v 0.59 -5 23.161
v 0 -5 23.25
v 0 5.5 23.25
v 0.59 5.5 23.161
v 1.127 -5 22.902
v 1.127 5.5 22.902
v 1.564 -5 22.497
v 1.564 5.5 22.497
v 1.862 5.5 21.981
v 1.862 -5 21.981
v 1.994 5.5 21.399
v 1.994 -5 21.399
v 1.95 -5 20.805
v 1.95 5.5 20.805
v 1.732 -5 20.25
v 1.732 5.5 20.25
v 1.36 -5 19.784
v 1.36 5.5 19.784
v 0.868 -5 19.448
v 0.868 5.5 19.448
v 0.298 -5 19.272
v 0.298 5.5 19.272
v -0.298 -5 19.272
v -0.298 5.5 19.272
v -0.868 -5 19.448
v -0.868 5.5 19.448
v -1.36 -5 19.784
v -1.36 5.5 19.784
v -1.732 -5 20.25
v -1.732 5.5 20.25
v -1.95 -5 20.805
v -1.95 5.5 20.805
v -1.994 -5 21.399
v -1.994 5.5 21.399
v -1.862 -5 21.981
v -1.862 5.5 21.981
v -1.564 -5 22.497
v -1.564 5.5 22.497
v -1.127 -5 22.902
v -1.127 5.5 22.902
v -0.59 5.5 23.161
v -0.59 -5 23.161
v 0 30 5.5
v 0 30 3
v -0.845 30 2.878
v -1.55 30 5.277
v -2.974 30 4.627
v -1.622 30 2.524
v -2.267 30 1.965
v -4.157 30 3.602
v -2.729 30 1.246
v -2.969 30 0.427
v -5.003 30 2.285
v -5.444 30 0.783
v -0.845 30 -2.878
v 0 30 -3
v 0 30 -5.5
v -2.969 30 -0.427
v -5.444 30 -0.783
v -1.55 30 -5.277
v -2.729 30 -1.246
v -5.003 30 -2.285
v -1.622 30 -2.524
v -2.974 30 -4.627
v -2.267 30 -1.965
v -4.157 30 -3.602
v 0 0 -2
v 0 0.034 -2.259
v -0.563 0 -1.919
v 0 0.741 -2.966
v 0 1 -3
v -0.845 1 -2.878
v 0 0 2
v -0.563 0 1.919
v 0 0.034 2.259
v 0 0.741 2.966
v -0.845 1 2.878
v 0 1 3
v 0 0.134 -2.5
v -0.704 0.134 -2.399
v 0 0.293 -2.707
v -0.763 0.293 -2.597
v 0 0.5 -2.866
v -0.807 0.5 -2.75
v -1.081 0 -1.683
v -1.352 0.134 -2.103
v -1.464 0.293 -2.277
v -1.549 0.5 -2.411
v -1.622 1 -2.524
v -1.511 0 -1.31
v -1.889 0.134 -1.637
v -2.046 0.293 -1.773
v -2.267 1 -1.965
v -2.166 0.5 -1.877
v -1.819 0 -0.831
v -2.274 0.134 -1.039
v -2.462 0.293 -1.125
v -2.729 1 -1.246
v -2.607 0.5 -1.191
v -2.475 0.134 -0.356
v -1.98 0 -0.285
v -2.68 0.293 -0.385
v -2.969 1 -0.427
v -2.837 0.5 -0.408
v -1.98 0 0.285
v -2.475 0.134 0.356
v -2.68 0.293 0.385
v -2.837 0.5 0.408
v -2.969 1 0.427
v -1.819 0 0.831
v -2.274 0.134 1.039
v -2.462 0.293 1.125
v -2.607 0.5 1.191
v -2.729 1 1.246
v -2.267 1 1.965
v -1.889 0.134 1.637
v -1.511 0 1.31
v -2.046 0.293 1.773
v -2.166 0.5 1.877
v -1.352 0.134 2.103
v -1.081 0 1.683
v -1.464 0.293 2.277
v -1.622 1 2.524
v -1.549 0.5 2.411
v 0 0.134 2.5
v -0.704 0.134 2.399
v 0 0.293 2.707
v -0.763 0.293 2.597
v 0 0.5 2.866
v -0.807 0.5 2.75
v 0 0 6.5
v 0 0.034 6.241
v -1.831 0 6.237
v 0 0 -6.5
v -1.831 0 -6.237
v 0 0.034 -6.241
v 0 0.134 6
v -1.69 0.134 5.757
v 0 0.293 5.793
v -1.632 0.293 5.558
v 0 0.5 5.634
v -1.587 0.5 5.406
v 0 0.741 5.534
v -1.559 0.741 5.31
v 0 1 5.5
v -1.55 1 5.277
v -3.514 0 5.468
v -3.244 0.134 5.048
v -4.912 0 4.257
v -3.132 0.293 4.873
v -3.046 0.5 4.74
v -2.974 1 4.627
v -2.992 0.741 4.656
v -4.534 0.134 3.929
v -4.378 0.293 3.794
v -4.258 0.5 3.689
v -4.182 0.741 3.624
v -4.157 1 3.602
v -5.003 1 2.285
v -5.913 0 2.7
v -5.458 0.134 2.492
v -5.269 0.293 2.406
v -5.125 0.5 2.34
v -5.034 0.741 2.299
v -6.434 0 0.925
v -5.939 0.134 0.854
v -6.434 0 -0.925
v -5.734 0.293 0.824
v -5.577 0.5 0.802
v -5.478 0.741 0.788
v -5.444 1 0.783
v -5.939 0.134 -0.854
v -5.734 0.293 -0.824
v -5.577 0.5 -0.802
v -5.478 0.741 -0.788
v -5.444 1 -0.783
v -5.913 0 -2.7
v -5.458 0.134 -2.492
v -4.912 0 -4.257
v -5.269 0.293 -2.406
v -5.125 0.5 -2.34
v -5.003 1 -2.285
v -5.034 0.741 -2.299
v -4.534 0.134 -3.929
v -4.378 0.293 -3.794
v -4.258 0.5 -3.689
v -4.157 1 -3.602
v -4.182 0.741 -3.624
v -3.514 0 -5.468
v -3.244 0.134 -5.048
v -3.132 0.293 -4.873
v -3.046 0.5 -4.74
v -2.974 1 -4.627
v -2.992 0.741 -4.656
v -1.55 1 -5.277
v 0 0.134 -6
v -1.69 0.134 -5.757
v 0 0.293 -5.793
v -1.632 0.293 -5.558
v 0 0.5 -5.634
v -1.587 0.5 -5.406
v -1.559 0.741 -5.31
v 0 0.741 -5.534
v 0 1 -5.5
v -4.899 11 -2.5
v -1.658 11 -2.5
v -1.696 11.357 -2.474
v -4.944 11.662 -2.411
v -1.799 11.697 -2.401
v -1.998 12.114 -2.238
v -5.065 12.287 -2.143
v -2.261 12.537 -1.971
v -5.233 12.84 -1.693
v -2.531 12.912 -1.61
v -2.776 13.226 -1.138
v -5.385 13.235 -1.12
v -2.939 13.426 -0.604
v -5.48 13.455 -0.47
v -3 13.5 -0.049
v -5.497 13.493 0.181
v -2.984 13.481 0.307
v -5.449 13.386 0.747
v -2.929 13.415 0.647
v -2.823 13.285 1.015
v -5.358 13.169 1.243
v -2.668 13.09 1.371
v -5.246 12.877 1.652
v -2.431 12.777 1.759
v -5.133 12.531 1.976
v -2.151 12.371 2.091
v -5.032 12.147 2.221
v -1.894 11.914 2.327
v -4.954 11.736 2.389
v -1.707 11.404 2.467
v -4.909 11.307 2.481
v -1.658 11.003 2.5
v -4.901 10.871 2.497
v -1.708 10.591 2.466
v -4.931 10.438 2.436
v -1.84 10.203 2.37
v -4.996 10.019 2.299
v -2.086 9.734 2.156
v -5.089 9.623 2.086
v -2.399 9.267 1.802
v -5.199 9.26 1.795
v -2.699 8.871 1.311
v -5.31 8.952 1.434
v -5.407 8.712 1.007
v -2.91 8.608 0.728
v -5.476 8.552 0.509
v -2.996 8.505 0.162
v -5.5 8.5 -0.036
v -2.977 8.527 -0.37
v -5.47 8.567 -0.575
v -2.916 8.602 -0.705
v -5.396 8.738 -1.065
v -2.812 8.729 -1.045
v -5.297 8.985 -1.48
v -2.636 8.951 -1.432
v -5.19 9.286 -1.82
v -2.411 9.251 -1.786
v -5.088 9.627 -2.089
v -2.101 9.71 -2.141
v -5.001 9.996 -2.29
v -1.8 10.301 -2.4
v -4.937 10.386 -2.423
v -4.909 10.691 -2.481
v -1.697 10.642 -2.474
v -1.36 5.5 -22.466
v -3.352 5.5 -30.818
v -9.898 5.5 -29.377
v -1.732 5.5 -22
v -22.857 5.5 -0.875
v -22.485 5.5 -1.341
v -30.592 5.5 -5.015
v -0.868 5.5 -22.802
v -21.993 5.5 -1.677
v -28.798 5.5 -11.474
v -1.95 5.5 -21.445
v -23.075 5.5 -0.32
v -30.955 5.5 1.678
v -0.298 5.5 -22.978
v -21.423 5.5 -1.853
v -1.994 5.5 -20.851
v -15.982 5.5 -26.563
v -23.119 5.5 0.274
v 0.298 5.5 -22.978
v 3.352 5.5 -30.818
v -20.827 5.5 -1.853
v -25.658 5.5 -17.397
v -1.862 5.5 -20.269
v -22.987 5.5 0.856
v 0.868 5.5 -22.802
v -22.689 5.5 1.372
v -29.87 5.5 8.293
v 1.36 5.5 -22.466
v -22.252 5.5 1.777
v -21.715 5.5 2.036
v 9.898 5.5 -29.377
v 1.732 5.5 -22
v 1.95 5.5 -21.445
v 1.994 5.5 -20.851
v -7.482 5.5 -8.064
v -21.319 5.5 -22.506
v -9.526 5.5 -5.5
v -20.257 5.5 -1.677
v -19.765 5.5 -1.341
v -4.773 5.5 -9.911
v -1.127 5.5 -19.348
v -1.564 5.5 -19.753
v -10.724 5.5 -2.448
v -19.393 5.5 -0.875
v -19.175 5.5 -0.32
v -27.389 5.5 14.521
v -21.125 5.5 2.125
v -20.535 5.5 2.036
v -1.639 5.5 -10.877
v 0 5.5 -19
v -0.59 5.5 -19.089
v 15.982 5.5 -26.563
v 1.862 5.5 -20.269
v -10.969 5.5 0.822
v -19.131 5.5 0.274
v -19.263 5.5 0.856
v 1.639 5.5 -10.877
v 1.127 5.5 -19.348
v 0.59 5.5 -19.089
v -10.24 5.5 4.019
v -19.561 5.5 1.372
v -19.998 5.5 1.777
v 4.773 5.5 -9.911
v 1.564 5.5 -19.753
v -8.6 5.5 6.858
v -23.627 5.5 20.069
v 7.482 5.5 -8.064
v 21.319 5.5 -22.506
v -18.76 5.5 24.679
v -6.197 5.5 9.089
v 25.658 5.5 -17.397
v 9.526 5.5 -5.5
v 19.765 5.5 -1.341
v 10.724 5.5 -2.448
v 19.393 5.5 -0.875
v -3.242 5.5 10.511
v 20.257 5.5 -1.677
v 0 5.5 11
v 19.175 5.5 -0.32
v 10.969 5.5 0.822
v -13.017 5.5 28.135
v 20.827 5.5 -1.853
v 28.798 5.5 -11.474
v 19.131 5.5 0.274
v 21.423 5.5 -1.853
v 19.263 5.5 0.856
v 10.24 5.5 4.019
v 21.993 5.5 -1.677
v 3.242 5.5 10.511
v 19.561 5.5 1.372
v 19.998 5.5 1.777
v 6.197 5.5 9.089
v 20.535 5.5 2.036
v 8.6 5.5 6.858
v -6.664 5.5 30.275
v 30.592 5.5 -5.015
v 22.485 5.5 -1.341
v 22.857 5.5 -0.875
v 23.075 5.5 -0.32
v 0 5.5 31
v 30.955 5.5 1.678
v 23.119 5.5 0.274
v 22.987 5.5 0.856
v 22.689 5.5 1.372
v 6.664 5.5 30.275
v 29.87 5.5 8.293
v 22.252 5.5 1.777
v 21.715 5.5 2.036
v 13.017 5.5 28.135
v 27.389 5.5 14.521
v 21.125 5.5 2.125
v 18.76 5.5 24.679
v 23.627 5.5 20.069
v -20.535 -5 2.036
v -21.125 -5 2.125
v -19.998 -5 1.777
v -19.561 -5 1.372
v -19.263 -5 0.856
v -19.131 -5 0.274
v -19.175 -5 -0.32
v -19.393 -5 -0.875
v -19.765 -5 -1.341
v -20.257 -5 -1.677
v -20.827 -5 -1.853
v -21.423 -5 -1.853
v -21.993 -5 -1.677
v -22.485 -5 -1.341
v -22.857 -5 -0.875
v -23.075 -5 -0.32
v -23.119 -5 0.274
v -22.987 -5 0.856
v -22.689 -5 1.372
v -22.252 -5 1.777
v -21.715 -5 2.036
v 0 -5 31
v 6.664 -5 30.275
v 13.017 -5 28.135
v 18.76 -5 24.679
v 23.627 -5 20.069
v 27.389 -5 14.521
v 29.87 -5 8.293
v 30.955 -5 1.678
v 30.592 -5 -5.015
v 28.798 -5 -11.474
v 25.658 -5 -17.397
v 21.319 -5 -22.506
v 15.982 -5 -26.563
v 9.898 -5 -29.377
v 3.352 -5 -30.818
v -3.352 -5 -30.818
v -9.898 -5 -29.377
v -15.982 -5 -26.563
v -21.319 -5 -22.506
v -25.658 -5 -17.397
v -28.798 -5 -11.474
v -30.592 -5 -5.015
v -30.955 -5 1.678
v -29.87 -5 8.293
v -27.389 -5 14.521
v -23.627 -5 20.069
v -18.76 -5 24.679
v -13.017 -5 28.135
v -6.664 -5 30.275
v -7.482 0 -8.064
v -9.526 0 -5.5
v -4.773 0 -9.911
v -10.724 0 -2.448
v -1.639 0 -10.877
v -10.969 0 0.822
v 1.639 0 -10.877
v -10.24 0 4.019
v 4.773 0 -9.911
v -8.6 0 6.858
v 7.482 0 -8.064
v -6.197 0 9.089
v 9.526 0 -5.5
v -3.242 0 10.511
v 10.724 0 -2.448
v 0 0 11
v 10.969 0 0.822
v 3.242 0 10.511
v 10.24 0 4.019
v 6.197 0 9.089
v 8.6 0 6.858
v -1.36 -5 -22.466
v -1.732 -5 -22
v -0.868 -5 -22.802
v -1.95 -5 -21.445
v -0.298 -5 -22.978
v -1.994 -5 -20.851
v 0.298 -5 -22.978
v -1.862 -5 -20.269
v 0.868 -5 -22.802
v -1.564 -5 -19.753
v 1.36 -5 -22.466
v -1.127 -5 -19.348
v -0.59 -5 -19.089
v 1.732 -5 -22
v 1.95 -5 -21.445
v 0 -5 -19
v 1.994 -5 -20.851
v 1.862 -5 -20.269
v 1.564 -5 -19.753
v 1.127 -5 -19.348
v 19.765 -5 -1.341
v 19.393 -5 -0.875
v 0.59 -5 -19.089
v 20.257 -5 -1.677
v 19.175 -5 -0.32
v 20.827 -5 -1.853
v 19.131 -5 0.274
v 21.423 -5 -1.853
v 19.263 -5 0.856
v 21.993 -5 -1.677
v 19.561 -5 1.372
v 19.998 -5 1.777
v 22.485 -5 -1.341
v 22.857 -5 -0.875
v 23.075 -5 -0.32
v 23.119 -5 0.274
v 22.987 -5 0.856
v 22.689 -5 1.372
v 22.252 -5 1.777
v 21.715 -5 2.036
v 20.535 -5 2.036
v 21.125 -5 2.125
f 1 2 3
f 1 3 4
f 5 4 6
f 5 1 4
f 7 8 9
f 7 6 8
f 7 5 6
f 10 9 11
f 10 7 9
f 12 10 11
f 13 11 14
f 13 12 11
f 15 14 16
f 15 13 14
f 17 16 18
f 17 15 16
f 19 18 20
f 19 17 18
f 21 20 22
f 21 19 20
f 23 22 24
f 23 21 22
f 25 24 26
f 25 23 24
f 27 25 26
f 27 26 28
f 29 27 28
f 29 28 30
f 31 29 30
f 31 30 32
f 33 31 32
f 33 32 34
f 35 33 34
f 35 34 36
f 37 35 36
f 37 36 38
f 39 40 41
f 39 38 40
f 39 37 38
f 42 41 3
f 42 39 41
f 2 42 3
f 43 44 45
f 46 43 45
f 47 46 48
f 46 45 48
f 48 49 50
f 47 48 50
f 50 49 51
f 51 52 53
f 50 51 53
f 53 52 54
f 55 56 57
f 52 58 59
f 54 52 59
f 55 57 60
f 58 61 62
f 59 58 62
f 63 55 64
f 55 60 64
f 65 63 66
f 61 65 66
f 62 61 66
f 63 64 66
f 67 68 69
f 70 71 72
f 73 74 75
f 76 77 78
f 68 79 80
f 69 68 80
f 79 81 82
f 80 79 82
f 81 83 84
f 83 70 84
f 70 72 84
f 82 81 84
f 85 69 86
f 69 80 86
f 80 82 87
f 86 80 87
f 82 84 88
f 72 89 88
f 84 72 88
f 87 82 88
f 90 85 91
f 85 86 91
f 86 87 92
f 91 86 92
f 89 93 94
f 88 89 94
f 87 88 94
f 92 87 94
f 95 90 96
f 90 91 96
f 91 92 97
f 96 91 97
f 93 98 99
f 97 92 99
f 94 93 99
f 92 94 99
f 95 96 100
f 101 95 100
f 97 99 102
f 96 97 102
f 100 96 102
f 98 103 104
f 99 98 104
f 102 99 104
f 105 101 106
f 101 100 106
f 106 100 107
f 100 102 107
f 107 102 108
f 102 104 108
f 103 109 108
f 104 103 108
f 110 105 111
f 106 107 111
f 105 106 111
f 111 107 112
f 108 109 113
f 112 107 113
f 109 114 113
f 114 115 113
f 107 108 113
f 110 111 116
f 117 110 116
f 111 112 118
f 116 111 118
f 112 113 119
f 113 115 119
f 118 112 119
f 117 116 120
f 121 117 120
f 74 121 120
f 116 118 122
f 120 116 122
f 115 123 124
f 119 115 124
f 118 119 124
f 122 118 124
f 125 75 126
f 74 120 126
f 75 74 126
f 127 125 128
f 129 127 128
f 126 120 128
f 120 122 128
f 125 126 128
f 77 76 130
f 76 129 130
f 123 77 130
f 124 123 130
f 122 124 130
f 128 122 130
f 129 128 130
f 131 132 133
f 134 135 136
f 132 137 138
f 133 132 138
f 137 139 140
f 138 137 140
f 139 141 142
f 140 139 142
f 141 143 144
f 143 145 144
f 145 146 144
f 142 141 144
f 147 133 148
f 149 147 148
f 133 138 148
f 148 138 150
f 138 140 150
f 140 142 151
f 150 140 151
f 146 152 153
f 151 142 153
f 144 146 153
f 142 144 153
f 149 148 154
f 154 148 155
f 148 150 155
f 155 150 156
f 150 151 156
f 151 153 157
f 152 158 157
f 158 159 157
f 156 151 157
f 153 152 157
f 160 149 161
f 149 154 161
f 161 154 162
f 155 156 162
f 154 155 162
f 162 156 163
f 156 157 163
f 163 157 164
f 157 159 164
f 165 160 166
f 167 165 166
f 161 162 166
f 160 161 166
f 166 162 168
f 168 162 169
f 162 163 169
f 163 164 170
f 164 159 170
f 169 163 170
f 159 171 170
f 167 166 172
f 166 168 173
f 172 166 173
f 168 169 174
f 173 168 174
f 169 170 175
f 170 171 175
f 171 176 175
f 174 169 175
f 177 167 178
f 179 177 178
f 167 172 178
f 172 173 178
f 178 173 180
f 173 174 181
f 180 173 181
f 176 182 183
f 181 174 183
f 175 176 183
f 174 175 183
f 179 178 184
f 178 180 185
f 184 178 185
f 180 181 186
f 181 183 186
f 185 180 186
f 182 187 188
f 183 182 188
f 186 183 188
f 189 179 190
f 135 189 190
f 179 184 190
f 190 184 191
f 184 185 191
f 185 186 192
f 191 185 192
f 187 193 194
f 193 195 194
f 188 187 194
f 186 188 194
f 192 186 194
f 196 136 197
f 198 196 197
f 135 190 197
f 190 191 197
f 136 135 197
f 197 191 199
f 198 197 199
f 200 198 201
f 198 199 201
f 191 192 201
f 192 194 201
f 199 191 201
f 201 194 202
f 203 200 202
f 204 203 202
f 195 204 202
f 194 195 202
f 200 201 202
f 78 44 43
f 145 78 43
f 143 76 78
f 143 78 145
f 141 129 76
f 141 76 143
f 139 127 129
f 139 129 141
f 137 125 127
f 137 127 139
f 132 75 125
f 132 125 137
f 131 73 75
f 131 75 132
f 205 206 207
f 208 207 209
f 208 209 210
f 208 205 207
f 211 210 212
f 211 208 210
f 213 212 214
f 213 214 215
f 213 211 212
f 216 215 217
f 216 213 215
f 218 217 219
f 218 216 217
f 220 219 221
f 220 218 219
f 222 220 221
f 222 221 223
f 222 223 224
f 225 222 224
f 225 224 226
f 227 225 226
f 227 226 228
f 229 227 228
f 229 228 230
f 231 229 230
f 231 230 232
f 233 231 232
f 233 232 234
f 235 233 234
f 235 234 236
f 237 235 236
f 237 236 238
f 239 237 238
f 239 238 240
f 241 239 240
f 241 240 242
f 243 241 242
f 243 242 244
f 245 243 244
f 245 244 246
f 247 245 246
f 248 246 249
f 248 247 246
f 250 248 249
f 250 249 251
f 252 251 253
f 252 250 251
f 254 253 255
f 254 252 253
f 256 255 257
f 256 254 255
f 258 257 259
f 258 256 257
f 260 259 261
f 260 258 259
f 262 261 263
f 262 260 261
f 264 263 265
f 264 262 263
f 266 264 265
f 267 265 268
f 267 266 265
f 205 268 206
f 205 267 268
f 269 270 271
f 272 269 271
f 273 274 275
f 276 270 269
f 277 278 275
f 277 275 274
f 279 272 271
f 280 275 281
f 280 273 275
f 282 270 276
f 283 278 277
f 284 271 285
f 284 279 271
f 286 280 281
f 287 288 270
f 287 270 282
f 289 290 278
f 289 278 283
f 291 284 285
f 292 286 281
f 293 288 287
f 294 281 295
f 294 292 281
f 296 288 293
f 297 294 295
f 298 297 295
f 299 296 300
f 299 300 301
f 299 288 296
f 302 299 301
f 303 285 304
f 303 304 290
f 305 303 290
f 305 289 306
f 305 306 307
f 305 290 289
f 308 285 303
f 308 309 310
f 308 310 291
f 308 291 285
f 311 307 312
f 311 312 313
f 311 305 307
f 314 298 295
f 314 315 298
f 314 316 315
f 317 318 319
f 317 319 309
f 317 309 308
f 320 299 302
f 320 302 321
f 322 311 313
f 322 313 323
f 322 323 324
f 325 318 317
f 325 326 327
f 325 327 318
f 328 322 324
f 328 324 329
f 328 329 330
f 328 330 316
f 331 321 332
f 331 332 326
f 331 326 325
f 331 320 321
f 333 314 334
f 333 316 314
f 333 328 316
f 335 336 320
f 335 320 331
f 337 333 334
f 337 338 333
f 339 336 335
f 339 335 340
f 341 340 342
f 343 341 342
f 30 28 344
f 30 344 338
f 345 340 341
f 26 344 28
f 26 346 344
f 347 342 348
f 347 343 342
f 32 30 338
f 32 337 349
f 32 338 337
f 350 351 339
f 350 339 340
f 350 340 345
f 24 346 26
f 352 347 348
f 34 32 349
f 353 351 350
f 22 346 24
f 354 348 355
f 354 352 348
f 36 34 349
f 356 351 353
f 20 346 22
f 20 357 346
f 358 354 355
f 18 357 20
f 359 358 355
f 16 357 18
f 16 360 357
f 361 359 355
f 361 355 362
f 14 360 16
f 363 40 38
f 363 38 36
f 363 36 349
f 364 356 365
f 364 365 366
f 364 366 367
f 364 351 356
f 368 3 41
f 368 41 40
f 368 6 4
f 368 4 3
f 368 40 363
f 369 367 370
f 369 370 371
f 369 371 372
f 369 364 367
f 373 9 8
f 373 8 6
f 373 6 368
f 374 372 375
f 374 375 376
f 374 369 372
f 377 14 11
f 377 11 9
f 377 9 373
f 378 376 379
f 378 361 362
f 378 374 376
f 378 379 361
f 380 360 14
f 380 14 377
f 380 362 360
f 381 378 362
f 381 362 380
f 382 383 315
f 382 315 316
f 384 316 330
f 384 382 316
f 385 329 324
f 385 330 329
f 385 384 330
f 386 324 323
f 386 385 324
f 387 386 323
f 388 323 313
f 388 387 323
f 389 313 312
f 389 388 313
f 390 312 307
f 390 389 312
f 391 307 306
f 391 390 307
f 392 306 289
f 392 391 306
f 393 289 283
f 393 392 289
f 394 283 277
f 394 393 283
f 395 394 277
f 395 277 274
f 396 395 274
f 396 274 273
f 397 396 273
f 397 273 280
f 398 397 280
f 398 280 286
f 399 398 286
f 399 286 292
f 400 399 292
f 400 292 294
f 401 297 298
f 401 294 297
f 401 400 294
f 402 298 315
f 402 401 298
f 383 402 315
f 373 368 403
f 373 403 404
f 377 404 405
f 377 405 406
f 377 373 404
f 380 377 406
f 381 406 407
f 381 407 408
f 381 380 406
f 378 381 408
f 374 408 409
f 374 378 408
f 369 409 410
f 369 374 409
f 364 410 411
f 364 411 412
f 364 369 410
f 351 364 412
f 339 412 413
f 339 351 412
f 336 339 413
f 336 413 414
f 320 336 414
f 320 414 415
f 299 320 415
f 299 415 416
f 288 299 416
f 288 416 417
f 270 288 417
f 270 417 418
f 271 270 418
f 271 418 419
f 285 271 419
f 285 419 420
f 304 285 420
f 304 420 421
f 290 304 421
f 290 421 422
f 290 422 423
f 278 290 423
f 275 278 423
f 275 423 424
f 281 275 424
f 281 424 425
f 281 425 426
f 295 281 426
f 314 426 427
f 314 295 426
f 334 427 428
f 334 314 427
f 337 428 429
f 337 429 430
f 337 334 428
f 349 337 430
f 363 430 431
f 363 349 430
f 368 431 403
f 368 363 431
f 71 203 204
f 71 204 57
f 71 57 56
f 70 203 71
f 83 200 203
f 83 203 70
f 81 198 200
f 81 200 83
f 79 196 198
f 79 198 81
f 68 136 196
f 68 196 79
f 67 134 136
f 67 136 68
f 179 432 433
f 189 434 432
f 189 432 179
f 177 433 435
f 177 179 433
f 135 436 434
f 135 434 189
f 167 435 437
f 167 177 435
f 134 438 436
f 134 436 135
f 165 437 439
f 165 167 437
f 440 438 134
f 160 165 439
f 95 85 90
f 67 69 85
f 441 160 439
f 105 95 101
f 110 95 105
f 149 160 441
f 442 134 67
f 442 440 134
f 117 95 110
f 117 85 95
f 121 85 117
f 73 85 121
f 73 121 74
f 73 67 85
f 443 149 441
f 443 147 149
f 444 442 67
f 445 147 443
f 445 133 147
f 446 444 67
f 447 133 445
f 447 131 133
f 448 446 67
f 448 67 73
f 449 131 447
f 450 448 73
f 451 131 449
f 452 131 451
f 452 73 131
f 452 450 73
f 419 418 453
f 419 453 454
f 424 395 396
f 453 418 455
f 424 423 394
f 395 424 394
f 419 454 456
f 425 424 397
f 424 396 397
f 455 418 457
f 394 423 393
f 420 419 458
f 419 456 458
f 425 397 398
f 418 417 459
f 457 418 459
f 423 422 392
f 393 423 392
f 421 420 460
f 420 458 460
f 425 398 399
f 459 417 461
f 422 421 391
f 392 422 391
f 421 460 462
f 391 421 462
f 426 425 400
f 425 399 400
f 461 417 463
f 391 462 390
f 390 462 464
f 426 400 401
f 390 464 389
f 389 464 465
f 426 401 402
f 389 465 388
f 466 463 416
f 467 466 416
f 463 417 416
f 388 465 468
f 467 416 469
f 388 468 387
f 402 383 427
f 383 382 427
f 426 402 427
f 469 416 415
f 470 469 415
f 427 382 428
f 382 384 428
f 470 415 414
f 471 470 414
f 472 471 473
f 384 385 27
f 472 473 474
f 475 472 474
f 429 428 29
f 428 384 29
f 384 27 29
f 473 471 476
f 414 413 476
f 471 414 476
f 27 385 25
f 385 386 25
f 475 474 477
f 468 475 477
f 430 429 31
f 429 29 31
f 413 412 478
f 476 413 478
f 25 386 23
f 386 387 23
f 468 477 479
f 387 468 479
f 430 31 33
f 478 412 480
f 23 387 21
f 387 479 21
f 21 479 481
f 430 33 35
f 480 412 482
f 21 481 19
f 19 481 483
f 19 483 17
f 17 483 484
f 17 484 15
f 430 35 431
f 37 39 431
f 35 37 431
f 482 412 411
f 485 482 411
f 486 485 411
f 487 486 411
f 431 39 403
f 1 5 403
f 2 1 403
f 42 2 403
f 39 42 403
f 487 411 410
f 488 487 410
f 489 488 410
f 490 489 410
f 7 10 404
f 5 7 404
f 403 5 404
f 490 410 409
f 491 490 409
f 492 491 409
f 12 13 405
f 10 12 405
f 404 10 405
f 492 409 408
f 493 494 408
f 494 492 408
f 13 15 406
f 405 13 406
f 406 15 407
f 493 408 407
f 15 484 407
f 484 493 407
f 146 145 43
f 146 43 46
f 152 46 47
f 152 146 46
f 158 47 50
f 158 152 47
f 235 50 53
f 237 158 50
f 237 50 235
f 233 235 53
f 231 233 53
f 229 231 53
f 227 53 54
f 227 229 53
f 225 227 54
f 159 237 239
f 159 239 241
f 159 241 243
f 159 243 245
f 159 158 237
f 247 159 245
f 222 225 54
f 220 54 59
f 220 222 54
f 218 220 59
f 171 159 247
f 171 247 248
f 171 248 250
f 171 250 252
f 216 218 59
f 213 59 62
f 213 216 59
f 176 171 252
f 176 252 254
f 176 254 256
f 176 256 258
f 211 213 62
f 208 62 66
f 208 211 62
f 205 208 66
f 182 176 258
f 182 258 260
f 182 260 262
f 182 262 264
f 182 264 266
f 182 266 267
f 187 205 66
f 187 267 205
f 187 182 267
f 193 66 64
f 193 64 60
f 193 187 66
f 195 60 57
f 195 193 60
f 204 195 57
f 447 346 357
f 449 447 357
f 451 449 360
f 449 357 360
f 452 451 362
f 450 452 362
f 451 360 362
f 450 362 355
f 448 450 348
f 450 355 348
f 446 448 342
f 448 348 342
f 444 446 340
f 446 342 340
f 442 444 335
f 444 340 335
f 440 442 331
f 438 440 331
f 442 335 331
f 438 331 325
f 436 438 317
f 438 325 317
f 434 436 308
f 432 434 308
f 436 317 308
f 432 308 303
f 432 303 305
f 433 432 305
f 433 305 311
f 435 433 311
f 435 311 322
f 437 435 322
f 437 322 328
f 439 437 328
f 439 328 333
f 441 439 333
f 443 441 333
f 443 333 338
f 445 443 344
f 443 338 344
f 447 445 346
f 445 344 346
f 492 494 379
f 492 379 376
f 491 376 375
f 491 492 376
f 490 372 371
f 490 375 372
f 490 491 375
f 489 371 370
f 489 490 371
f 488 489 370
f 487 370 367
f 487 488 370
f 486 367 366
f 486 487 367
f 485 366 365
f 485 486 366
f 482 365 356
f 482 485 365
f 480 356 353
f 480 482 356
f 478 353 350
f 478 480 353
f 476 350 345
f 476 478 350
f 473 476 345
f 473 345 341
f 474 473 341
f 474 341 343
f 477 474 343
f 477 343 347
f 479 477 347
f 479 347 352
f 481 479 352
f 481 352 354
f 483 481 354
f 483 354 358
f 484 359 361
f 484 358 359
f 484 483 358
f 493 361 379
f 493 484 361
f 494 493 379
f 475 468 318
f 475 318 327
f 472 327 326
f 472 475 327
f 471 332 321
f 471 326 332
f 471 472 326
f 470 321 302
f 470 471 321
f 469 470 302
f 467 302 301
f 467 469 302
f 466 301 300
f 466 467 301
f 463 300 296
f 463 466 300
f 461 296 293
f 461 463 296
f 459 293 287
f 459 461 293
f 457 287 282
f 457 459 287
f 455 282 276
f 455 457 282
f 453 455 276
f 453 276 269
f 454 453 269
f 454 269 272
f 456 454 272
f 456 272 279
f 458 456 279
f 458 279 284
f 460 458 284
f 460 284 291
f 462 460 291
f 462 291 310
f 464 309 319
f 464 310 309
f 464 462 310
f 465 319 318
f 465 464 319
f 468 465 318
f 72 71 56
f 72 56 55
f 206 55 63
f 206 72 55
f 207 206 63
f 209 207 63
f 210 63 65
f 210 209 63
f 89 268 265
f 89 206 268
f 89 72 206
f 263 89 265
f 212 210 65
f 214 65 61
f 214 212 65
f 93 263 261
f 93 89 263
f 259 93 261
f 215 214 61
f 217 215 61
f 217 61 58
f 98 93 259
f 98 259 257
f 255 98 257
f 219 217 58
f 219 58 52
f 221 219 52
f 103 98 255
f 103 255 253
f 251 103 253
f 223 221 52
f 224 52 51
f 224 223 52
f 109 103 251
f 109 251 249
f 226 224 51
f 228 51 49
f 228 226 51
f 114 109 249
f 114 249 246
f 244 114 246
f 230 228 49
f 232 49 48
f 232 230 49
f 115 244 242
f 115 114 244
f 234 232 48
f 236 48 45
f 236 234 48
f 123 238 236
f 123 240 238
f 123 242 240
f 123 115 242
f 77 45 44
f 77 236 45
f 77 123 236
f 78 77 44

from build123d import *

# Parameters (mm, degrees)
BOSS_EXTRUDE2_DEPTH     = 30
SKETCH2_R               = 31
BOSS_EXTRUDE3_DEPTH     = 5
FILLET1_R               = 1
BOSS_EXTRUDE4_START     = 5.5
SKETCH3_R               = 31
SKETCH3_R_2             = 11
BOSS_EXTRUDE4_DEPTH     = 5.5
CUT_EXTRUDE1_DEPTH      = 51.222007128
CUT_EXTRUDE1_DEPTH_BACK = 51.222007128
SKETCH4_R               = 2
CUT_EXTRUDE2_DEPTH      = 54.122499941
CUT_EXTRUDE2_DEPTH_BACK = 54.122499941
SKETCH6_R               = 2.5
FILLET2_R               = 1


with BuildPart() as part:
    # Sketch1 → Boss-Extrude2 (new body)
    with BuildSketch(Plane(origin=(0, 0, 0), x_dir=(1, 0, 0), z_dir=(0, 1, 0))):
        with BuildLine():
            Line((0, 5.5), (0, 3))
            ThreePointArc((0, 3), (-3, 0), (0, -3))
            Line((0, -3), (0, -5.5))
            ThreePointArc((0, -5.5), (-5.5, 0), (0, 5.5))
        make_face()
    extrude(amount=BOSS_EXTRUDE2_DEPTH)

    # Sketch2 → Boss-Extrude3 (add)
    with BuildSketch(Plane(origin=(0, 0, 0), x_dir=(1, 0, 0), z_dir=(0, 1, 0))):
        with Locations(Location((0, 0, 0), (0, 0, 270))):
            Circle(SKETCH2_R)
    extrude(amount=-BOSS_EXTRUDE3_DEPTH)

    # Fillet1
    fillet1_edges = [part.edges().sort_by_distance(p)[0] for p in [
        (-5.5, 0, 0),
    ]]
    fillet(fillet1_edges, radius=FILLET1_R)

    # Sketch3 → Boss-Extrude4 (add)
    with BuildSketch(Plane(origin=(0, 0, 0), x_dir=(1, 0, 0), z_dir=(0, 1, 0)).offset(BOSS_EXTRUDE4_START)):
        with Locations(Location((0, 0, 0), (0, 0, 270))):
            Circle(SKETCH3_R)
        with Locations(Location((0, 0, 0), (0, 0, 270))):
            Circle(SKETCH3_R_2, mode=Mode.SUBTRACT)
    extrude(amount=-BOSS_EXTRUDE4_DEPTH)

    # Sketch4 → Cut-Extrude1 (cut, two sides: drawn at the far end of the back side and taken through both)
    with BuildSketch(Plane(origin=(0, 5.5, 0), x_dir=(1, 0, 0), z_dir=(0, 1, 0)).offset(-CUT_EXTRUDE1_DEPTH_BACK)):
        with Locations(Location((0, 21, 0), (0, 0, 270))):
            Circle(SKETCH4_R)
        with Locations(Location((21.125, -0.125, 0), (0, 0, 270))):
            Circle(SKETCH4_R)
        with Locations(Location((0, -21.25, 0), (0, 0, 270))):
            Circle(SKETCH4_R)
        with Locations(Location((-21.125, -0.125, 0), (0, 0, 270))):
            Circle(SKETCH4_R)
    extrude(amount=CUT_EXTRUDE1_DEPTH + CUT_EXTRUDE1_DEPTH_BACK, mode=Mode.SUBTRACT)

    # Sketch6 → Cut-Extrude2 (cut, two sides: drawn at the far end of the back side and taken through both)
    with BuildSketch(Plane(origin=(0, 0, 0), x_dir=(0, 0, -1), z_dir=(1, 0, 0)).offset(-CUT_EXTRUDE2_DEPTH_BACK)):
        with Locations((0, 11)):
            Circle(SKETCH6_R)
    extrude(amount=CUT_EXTRUDE2_DEPTH + CUT_EXTRUDE2_DEPTH_BACK, mode=Mode.SUBTRACT)

    # Fillet2
    fillet2_edges = [part.edges().sort_by_distance(p)[0] for p in [
        (-3, 0, 0),
    ]]
    fillet(fillet2_edges, radius=FILLET2_R)


solid = part.part
